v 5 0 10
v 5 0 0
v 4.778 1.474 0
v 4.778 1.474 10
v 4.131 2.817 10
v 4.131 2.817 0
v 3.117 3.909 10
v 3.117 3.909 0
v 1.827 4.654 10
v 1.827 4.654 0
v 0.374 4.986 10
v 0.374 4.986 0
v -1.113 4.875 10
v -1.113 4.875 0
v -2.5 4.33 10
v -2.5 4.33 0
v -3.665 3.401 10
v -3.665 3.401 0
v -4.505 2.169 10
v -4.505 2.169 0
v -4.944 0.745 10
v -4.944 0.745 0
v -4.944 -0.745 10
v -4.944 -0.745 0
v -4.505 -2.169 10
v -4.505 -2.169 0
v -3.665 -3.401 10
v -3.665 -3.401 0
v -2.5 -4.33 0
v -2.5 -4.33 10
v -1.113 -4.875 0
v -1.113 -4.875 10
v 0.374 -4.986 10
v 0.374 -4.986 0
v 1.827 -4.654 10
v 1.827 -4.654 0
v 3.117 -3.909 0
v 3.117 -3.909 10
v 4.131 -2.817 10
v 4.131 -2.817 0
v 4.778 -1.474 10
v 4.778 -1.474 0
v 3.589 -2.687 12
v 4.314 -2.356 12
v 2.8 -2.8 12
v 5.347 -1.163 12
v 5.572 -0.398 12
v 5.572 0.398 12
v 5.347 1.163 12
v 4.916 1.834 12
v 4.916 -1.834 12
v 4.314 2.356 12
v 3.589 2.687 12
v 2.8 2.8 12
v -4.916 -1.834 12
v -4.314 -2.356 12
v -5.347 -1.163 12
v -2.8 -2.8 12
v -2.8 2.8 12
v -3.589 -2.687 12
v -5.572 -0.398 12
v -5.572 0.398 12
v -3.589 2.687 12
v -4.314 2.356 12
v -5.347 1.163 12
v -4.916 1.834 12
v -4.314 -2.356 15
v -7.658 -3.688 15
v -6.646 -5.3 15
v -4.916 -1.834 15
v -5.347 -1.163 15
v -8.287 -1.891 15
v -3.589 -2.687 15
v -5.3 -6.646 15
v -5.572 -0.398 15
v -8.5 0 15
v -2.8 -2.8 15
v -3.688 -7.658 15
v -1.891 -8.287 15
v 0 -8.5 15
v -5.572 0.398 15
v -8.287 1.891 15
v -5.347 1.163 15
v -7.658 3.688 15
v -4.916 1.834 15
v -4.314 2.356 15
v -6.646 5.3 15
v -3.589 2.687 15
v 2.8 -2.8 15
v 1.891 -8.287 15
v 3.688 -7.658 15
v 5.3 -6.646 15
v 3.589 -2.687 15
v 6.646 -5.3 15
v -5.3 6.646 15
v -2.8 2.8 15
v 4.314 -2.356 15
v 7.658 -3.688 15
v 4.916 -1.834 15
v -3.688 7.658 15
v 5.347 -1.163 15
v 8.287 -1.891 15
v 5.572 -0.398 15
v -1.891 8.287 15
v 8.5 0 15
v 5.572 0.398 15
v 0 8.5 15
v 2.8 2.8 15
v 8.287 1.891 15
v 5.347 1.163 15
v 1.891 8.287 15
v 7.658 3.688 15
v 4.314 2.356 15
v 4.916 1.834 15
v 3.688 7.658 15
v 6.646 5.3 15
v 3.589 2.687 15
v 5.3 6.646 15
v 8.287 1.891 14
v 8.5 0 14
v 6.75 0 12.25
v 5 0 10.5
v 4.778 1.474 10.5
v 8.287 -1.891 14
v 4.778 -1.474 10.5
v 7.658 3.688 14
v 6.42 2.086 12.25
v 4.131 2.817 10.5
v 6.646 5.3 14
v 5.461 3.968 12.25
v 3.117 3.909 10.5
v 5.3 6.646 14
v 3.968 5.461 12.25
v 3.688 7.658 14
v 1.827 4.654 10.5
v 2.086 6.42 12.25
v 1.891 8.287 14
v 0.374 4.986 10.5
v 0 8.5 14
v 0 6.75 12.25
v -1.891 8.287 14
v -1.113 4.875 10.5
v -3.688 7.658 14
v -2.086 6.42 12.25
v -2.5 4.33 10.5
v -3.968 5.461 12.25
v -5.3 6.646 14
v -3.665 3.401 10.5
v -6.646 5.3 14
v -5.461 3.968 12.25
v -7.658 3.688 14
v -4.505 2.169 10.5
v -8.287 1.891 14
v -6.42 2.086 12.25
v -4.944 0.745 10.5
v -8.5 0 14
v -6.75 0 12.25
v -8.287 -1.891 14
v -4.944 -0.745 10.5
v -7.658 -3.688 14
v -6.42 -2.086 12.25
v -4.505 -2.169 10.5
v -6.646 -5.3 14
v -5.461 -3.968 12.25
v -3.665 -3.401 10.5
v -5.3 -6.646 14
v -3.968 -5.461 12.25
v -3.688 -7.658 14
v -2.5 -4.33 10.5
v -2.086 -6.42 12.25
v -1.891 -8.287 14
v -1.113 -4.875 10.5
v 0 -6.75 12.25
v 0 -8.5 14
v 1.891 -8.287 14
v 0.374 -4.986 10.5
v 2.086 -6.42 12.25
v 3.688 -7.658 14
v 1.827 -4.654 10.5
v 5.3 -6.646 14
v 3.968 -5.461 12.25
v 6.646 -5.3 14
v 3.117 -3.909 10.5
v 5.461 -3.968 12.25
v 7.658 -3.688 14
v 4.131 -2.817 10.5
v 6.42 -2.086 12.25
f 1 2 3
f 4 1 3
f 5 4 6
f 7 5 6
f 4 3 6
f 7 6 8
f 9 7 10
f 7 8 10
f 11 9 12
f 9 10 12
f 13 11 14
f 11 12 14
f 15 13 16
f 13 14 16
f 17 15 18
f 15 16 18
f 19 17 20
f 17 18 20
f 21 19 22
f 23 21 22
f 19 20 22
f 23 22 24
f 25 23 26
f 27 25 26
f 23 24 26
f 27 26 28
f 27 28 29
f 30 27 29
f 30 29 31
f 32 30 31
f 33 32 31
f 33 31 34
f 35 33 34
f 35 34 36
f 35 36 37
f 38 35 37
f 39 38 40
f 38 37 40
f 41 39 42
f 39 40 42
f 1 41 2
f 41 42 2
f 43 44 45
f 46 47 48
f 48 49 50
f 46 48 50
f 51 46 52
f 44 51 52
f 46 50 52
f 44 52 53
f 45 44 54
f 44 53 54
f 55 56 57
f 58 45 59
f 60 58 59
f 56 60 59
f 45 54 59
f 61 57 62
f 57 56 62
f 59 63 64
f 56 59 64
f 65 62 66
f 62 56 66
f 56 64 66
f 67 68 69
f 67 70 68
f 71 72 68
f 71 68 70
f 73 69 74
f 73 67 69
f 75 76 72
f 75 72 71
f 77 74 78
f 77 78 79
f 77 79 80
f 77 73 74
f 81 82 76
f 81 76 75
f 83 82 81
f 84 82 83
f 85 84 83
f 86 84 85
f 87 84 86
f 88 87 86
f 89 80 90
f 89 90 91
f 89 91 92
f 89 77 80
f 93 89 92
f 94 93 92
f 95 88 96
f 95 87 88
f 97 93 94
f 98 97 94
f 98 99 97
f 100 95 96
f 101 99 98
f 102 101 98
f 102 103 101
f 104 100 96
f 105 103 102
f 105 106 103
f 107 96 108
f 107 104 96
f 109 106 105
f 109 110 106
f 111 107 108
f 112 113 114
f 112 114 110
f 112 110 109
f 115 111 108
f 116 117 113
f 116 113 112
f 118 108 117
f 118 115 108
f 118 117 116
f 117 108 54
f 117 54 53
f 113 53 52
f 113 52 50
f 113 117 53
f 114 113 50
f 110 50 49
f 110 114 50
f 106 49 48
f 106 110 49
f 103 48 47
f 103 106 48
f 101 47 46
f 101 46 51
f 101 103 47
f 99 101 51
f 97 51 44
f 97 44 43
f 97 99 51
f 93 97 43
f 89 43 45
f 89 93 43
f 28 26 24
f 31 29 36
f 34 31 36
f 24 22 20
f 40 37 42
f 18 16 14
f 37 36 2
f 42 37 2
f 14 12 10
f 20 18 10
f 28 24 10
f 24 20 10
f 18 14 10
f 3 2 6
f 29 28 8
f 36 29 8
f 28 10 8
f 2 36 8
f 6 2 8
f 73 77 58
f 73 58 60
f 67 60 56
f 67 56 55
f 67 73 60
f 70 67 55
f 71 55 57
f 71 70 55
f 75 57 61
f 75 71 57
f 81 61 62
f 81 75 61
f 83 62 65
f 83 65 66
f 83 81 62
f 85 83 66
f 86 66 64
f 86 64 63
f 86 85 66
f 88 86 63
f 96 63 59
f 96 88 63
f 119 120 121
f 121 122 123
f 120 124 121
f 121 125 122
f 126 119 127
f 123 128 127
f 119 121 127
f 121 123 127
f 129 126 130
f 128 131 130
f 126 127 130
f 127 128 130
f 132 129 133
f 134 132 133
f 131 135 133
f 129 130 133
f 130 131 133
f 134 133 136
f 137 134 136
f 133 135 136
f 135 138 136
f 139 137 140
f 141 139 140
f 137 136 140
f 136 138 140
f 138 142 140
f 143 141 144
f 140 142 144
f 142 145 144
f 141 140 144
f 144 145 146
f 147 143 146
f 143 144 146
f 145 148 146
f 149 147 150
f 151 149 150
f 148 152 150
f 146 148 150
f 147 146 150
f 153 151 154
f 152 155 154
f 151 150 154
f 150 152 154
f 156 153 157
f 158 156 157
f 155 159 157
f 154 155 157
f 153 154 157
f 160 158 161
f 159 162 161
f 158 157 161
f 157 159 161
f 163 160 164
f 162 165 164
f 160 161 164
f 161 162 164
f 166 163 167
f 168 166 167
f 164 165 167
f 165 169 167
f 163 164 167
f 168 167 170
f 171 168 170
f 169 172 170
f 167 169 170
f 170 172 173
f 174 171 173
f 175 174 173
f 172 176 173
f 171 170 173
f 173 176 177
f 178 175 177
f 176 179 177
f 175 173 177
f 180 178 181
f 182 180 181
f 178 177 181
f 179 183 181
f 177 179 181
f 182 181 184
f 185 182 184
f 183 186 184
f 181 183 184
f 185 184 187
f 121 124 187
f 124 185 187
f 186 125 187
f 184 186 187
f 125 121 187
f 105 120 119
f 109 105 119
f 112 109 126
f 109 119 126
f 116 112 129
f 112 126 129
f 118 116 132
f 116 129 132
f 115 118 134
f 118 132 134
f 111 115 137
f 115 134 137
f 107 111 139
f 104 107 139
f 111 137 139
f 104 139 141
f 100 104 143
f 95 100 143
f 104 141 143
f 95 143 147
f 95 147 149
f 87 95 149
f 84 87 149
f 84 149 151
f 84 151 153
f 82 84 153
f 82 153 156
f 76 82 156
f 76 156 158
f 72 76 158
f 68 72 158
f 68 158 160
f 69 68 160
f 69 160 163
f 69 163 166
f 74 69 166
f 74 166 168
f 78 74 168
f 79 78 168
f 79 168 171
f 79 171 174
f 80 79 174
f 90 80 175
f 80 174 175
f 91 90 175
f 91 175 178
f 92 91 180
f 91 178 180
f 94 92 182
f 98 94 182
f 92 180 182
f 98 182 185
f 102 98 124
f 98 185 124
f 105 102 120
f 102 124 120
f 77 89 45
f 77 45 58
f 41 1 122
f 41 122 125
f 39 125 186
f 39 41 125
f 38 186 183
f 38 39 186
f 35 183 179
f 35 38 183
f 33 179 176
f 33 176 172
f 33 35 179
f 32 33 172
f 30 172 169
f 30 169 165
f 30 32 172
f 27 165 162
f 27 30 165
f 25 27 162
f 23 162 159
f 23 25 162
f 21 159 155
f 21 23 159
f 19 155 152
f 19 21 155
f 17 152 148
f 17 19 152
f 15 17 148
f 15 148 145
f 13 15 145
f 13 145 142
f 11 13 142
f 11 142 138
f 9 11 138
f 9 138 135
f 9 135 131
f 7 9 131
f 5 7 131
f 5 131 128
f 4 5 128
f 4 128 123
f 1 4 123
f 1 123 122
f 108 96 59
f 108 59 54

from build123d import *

# Parameters (mm, degrees)
SKETCH1_R           = 5
BOSS_EXTRUDE1_DEPTH = 10
SKETCH2_R           = 8.5
BOSS_EXTRUDE2_DEPTH = 5
CUT_EXTRUDE1_DEPTH  = 3
CHAMFER1_SIZE       = 4


with BuildPart() as part:
    # Sketch1 → Boss-Extrude1 (new body)
    with BuildSketch(Plane.XY):
        Circle(SKETCH1_R)
    extrude(amount=BOSS_EXTRUDE1_DEPTH)

    # Sketch2 → Boss-Extrude2 (add)
    with BuildSketch(Plane.XY.offset(10)):
        Circle(SKETCH2_R)
    extrude(amount=BOSS_EXTRUDE2_DEPTH)

    # Sketch3 → Cut-Extrude1 (cut)
    with BuildSketch(Plane.XY.offset(15)):
        with BuildLine():
            Line((-2.8, 2.8), (2.8, 2.8))
            ThreePointArc((2.8, 2.8), (5.6, 0), (2.8, -2.8))
            Line((2.8, -2.8), (-2.8, -2.8))
            ThreePointArc((-2.8, -2.8), (-5.6, 0), (-2.8, 2.8))
        make_face()
    extrude(amount=-CUT_EXTRUDE1_DEPTH, mode=Mode.SUBTRACT)

    # Chamfer1
    # the kernel refuses this chamfer: 4 mm, written as the material it takes off along each edge
    with BuildSketch(Plane(origin=(0, 0, 10), x_dir=(1, 0, 0), z_dir=(0, -1, 0))) as chamfer1_piece_1_section:
        Polygon((8.5, CHAMFER1_SIZE), (8.5 - CHAMFER1_SIZE, 0), (8.5, 0), align=None)
    chamfer1_piece_1 = revolve(axis=Axis((0, 0, 10), (0, 0, 1)), mode=Mode.PRIVATE)
    chamfer1_piece_1 = chamfer1_piece_1 - Plane(origin=(0, 0, 12.254882924), x_dir=(1, 0, 0), z_dir=(0, 0, -1)) * Cylinder(5, 34, mode=Mode.PRIVATE)
    add(chamfer1_piece_1, mode=Mode.SUBTRACT)


solid = part.part
